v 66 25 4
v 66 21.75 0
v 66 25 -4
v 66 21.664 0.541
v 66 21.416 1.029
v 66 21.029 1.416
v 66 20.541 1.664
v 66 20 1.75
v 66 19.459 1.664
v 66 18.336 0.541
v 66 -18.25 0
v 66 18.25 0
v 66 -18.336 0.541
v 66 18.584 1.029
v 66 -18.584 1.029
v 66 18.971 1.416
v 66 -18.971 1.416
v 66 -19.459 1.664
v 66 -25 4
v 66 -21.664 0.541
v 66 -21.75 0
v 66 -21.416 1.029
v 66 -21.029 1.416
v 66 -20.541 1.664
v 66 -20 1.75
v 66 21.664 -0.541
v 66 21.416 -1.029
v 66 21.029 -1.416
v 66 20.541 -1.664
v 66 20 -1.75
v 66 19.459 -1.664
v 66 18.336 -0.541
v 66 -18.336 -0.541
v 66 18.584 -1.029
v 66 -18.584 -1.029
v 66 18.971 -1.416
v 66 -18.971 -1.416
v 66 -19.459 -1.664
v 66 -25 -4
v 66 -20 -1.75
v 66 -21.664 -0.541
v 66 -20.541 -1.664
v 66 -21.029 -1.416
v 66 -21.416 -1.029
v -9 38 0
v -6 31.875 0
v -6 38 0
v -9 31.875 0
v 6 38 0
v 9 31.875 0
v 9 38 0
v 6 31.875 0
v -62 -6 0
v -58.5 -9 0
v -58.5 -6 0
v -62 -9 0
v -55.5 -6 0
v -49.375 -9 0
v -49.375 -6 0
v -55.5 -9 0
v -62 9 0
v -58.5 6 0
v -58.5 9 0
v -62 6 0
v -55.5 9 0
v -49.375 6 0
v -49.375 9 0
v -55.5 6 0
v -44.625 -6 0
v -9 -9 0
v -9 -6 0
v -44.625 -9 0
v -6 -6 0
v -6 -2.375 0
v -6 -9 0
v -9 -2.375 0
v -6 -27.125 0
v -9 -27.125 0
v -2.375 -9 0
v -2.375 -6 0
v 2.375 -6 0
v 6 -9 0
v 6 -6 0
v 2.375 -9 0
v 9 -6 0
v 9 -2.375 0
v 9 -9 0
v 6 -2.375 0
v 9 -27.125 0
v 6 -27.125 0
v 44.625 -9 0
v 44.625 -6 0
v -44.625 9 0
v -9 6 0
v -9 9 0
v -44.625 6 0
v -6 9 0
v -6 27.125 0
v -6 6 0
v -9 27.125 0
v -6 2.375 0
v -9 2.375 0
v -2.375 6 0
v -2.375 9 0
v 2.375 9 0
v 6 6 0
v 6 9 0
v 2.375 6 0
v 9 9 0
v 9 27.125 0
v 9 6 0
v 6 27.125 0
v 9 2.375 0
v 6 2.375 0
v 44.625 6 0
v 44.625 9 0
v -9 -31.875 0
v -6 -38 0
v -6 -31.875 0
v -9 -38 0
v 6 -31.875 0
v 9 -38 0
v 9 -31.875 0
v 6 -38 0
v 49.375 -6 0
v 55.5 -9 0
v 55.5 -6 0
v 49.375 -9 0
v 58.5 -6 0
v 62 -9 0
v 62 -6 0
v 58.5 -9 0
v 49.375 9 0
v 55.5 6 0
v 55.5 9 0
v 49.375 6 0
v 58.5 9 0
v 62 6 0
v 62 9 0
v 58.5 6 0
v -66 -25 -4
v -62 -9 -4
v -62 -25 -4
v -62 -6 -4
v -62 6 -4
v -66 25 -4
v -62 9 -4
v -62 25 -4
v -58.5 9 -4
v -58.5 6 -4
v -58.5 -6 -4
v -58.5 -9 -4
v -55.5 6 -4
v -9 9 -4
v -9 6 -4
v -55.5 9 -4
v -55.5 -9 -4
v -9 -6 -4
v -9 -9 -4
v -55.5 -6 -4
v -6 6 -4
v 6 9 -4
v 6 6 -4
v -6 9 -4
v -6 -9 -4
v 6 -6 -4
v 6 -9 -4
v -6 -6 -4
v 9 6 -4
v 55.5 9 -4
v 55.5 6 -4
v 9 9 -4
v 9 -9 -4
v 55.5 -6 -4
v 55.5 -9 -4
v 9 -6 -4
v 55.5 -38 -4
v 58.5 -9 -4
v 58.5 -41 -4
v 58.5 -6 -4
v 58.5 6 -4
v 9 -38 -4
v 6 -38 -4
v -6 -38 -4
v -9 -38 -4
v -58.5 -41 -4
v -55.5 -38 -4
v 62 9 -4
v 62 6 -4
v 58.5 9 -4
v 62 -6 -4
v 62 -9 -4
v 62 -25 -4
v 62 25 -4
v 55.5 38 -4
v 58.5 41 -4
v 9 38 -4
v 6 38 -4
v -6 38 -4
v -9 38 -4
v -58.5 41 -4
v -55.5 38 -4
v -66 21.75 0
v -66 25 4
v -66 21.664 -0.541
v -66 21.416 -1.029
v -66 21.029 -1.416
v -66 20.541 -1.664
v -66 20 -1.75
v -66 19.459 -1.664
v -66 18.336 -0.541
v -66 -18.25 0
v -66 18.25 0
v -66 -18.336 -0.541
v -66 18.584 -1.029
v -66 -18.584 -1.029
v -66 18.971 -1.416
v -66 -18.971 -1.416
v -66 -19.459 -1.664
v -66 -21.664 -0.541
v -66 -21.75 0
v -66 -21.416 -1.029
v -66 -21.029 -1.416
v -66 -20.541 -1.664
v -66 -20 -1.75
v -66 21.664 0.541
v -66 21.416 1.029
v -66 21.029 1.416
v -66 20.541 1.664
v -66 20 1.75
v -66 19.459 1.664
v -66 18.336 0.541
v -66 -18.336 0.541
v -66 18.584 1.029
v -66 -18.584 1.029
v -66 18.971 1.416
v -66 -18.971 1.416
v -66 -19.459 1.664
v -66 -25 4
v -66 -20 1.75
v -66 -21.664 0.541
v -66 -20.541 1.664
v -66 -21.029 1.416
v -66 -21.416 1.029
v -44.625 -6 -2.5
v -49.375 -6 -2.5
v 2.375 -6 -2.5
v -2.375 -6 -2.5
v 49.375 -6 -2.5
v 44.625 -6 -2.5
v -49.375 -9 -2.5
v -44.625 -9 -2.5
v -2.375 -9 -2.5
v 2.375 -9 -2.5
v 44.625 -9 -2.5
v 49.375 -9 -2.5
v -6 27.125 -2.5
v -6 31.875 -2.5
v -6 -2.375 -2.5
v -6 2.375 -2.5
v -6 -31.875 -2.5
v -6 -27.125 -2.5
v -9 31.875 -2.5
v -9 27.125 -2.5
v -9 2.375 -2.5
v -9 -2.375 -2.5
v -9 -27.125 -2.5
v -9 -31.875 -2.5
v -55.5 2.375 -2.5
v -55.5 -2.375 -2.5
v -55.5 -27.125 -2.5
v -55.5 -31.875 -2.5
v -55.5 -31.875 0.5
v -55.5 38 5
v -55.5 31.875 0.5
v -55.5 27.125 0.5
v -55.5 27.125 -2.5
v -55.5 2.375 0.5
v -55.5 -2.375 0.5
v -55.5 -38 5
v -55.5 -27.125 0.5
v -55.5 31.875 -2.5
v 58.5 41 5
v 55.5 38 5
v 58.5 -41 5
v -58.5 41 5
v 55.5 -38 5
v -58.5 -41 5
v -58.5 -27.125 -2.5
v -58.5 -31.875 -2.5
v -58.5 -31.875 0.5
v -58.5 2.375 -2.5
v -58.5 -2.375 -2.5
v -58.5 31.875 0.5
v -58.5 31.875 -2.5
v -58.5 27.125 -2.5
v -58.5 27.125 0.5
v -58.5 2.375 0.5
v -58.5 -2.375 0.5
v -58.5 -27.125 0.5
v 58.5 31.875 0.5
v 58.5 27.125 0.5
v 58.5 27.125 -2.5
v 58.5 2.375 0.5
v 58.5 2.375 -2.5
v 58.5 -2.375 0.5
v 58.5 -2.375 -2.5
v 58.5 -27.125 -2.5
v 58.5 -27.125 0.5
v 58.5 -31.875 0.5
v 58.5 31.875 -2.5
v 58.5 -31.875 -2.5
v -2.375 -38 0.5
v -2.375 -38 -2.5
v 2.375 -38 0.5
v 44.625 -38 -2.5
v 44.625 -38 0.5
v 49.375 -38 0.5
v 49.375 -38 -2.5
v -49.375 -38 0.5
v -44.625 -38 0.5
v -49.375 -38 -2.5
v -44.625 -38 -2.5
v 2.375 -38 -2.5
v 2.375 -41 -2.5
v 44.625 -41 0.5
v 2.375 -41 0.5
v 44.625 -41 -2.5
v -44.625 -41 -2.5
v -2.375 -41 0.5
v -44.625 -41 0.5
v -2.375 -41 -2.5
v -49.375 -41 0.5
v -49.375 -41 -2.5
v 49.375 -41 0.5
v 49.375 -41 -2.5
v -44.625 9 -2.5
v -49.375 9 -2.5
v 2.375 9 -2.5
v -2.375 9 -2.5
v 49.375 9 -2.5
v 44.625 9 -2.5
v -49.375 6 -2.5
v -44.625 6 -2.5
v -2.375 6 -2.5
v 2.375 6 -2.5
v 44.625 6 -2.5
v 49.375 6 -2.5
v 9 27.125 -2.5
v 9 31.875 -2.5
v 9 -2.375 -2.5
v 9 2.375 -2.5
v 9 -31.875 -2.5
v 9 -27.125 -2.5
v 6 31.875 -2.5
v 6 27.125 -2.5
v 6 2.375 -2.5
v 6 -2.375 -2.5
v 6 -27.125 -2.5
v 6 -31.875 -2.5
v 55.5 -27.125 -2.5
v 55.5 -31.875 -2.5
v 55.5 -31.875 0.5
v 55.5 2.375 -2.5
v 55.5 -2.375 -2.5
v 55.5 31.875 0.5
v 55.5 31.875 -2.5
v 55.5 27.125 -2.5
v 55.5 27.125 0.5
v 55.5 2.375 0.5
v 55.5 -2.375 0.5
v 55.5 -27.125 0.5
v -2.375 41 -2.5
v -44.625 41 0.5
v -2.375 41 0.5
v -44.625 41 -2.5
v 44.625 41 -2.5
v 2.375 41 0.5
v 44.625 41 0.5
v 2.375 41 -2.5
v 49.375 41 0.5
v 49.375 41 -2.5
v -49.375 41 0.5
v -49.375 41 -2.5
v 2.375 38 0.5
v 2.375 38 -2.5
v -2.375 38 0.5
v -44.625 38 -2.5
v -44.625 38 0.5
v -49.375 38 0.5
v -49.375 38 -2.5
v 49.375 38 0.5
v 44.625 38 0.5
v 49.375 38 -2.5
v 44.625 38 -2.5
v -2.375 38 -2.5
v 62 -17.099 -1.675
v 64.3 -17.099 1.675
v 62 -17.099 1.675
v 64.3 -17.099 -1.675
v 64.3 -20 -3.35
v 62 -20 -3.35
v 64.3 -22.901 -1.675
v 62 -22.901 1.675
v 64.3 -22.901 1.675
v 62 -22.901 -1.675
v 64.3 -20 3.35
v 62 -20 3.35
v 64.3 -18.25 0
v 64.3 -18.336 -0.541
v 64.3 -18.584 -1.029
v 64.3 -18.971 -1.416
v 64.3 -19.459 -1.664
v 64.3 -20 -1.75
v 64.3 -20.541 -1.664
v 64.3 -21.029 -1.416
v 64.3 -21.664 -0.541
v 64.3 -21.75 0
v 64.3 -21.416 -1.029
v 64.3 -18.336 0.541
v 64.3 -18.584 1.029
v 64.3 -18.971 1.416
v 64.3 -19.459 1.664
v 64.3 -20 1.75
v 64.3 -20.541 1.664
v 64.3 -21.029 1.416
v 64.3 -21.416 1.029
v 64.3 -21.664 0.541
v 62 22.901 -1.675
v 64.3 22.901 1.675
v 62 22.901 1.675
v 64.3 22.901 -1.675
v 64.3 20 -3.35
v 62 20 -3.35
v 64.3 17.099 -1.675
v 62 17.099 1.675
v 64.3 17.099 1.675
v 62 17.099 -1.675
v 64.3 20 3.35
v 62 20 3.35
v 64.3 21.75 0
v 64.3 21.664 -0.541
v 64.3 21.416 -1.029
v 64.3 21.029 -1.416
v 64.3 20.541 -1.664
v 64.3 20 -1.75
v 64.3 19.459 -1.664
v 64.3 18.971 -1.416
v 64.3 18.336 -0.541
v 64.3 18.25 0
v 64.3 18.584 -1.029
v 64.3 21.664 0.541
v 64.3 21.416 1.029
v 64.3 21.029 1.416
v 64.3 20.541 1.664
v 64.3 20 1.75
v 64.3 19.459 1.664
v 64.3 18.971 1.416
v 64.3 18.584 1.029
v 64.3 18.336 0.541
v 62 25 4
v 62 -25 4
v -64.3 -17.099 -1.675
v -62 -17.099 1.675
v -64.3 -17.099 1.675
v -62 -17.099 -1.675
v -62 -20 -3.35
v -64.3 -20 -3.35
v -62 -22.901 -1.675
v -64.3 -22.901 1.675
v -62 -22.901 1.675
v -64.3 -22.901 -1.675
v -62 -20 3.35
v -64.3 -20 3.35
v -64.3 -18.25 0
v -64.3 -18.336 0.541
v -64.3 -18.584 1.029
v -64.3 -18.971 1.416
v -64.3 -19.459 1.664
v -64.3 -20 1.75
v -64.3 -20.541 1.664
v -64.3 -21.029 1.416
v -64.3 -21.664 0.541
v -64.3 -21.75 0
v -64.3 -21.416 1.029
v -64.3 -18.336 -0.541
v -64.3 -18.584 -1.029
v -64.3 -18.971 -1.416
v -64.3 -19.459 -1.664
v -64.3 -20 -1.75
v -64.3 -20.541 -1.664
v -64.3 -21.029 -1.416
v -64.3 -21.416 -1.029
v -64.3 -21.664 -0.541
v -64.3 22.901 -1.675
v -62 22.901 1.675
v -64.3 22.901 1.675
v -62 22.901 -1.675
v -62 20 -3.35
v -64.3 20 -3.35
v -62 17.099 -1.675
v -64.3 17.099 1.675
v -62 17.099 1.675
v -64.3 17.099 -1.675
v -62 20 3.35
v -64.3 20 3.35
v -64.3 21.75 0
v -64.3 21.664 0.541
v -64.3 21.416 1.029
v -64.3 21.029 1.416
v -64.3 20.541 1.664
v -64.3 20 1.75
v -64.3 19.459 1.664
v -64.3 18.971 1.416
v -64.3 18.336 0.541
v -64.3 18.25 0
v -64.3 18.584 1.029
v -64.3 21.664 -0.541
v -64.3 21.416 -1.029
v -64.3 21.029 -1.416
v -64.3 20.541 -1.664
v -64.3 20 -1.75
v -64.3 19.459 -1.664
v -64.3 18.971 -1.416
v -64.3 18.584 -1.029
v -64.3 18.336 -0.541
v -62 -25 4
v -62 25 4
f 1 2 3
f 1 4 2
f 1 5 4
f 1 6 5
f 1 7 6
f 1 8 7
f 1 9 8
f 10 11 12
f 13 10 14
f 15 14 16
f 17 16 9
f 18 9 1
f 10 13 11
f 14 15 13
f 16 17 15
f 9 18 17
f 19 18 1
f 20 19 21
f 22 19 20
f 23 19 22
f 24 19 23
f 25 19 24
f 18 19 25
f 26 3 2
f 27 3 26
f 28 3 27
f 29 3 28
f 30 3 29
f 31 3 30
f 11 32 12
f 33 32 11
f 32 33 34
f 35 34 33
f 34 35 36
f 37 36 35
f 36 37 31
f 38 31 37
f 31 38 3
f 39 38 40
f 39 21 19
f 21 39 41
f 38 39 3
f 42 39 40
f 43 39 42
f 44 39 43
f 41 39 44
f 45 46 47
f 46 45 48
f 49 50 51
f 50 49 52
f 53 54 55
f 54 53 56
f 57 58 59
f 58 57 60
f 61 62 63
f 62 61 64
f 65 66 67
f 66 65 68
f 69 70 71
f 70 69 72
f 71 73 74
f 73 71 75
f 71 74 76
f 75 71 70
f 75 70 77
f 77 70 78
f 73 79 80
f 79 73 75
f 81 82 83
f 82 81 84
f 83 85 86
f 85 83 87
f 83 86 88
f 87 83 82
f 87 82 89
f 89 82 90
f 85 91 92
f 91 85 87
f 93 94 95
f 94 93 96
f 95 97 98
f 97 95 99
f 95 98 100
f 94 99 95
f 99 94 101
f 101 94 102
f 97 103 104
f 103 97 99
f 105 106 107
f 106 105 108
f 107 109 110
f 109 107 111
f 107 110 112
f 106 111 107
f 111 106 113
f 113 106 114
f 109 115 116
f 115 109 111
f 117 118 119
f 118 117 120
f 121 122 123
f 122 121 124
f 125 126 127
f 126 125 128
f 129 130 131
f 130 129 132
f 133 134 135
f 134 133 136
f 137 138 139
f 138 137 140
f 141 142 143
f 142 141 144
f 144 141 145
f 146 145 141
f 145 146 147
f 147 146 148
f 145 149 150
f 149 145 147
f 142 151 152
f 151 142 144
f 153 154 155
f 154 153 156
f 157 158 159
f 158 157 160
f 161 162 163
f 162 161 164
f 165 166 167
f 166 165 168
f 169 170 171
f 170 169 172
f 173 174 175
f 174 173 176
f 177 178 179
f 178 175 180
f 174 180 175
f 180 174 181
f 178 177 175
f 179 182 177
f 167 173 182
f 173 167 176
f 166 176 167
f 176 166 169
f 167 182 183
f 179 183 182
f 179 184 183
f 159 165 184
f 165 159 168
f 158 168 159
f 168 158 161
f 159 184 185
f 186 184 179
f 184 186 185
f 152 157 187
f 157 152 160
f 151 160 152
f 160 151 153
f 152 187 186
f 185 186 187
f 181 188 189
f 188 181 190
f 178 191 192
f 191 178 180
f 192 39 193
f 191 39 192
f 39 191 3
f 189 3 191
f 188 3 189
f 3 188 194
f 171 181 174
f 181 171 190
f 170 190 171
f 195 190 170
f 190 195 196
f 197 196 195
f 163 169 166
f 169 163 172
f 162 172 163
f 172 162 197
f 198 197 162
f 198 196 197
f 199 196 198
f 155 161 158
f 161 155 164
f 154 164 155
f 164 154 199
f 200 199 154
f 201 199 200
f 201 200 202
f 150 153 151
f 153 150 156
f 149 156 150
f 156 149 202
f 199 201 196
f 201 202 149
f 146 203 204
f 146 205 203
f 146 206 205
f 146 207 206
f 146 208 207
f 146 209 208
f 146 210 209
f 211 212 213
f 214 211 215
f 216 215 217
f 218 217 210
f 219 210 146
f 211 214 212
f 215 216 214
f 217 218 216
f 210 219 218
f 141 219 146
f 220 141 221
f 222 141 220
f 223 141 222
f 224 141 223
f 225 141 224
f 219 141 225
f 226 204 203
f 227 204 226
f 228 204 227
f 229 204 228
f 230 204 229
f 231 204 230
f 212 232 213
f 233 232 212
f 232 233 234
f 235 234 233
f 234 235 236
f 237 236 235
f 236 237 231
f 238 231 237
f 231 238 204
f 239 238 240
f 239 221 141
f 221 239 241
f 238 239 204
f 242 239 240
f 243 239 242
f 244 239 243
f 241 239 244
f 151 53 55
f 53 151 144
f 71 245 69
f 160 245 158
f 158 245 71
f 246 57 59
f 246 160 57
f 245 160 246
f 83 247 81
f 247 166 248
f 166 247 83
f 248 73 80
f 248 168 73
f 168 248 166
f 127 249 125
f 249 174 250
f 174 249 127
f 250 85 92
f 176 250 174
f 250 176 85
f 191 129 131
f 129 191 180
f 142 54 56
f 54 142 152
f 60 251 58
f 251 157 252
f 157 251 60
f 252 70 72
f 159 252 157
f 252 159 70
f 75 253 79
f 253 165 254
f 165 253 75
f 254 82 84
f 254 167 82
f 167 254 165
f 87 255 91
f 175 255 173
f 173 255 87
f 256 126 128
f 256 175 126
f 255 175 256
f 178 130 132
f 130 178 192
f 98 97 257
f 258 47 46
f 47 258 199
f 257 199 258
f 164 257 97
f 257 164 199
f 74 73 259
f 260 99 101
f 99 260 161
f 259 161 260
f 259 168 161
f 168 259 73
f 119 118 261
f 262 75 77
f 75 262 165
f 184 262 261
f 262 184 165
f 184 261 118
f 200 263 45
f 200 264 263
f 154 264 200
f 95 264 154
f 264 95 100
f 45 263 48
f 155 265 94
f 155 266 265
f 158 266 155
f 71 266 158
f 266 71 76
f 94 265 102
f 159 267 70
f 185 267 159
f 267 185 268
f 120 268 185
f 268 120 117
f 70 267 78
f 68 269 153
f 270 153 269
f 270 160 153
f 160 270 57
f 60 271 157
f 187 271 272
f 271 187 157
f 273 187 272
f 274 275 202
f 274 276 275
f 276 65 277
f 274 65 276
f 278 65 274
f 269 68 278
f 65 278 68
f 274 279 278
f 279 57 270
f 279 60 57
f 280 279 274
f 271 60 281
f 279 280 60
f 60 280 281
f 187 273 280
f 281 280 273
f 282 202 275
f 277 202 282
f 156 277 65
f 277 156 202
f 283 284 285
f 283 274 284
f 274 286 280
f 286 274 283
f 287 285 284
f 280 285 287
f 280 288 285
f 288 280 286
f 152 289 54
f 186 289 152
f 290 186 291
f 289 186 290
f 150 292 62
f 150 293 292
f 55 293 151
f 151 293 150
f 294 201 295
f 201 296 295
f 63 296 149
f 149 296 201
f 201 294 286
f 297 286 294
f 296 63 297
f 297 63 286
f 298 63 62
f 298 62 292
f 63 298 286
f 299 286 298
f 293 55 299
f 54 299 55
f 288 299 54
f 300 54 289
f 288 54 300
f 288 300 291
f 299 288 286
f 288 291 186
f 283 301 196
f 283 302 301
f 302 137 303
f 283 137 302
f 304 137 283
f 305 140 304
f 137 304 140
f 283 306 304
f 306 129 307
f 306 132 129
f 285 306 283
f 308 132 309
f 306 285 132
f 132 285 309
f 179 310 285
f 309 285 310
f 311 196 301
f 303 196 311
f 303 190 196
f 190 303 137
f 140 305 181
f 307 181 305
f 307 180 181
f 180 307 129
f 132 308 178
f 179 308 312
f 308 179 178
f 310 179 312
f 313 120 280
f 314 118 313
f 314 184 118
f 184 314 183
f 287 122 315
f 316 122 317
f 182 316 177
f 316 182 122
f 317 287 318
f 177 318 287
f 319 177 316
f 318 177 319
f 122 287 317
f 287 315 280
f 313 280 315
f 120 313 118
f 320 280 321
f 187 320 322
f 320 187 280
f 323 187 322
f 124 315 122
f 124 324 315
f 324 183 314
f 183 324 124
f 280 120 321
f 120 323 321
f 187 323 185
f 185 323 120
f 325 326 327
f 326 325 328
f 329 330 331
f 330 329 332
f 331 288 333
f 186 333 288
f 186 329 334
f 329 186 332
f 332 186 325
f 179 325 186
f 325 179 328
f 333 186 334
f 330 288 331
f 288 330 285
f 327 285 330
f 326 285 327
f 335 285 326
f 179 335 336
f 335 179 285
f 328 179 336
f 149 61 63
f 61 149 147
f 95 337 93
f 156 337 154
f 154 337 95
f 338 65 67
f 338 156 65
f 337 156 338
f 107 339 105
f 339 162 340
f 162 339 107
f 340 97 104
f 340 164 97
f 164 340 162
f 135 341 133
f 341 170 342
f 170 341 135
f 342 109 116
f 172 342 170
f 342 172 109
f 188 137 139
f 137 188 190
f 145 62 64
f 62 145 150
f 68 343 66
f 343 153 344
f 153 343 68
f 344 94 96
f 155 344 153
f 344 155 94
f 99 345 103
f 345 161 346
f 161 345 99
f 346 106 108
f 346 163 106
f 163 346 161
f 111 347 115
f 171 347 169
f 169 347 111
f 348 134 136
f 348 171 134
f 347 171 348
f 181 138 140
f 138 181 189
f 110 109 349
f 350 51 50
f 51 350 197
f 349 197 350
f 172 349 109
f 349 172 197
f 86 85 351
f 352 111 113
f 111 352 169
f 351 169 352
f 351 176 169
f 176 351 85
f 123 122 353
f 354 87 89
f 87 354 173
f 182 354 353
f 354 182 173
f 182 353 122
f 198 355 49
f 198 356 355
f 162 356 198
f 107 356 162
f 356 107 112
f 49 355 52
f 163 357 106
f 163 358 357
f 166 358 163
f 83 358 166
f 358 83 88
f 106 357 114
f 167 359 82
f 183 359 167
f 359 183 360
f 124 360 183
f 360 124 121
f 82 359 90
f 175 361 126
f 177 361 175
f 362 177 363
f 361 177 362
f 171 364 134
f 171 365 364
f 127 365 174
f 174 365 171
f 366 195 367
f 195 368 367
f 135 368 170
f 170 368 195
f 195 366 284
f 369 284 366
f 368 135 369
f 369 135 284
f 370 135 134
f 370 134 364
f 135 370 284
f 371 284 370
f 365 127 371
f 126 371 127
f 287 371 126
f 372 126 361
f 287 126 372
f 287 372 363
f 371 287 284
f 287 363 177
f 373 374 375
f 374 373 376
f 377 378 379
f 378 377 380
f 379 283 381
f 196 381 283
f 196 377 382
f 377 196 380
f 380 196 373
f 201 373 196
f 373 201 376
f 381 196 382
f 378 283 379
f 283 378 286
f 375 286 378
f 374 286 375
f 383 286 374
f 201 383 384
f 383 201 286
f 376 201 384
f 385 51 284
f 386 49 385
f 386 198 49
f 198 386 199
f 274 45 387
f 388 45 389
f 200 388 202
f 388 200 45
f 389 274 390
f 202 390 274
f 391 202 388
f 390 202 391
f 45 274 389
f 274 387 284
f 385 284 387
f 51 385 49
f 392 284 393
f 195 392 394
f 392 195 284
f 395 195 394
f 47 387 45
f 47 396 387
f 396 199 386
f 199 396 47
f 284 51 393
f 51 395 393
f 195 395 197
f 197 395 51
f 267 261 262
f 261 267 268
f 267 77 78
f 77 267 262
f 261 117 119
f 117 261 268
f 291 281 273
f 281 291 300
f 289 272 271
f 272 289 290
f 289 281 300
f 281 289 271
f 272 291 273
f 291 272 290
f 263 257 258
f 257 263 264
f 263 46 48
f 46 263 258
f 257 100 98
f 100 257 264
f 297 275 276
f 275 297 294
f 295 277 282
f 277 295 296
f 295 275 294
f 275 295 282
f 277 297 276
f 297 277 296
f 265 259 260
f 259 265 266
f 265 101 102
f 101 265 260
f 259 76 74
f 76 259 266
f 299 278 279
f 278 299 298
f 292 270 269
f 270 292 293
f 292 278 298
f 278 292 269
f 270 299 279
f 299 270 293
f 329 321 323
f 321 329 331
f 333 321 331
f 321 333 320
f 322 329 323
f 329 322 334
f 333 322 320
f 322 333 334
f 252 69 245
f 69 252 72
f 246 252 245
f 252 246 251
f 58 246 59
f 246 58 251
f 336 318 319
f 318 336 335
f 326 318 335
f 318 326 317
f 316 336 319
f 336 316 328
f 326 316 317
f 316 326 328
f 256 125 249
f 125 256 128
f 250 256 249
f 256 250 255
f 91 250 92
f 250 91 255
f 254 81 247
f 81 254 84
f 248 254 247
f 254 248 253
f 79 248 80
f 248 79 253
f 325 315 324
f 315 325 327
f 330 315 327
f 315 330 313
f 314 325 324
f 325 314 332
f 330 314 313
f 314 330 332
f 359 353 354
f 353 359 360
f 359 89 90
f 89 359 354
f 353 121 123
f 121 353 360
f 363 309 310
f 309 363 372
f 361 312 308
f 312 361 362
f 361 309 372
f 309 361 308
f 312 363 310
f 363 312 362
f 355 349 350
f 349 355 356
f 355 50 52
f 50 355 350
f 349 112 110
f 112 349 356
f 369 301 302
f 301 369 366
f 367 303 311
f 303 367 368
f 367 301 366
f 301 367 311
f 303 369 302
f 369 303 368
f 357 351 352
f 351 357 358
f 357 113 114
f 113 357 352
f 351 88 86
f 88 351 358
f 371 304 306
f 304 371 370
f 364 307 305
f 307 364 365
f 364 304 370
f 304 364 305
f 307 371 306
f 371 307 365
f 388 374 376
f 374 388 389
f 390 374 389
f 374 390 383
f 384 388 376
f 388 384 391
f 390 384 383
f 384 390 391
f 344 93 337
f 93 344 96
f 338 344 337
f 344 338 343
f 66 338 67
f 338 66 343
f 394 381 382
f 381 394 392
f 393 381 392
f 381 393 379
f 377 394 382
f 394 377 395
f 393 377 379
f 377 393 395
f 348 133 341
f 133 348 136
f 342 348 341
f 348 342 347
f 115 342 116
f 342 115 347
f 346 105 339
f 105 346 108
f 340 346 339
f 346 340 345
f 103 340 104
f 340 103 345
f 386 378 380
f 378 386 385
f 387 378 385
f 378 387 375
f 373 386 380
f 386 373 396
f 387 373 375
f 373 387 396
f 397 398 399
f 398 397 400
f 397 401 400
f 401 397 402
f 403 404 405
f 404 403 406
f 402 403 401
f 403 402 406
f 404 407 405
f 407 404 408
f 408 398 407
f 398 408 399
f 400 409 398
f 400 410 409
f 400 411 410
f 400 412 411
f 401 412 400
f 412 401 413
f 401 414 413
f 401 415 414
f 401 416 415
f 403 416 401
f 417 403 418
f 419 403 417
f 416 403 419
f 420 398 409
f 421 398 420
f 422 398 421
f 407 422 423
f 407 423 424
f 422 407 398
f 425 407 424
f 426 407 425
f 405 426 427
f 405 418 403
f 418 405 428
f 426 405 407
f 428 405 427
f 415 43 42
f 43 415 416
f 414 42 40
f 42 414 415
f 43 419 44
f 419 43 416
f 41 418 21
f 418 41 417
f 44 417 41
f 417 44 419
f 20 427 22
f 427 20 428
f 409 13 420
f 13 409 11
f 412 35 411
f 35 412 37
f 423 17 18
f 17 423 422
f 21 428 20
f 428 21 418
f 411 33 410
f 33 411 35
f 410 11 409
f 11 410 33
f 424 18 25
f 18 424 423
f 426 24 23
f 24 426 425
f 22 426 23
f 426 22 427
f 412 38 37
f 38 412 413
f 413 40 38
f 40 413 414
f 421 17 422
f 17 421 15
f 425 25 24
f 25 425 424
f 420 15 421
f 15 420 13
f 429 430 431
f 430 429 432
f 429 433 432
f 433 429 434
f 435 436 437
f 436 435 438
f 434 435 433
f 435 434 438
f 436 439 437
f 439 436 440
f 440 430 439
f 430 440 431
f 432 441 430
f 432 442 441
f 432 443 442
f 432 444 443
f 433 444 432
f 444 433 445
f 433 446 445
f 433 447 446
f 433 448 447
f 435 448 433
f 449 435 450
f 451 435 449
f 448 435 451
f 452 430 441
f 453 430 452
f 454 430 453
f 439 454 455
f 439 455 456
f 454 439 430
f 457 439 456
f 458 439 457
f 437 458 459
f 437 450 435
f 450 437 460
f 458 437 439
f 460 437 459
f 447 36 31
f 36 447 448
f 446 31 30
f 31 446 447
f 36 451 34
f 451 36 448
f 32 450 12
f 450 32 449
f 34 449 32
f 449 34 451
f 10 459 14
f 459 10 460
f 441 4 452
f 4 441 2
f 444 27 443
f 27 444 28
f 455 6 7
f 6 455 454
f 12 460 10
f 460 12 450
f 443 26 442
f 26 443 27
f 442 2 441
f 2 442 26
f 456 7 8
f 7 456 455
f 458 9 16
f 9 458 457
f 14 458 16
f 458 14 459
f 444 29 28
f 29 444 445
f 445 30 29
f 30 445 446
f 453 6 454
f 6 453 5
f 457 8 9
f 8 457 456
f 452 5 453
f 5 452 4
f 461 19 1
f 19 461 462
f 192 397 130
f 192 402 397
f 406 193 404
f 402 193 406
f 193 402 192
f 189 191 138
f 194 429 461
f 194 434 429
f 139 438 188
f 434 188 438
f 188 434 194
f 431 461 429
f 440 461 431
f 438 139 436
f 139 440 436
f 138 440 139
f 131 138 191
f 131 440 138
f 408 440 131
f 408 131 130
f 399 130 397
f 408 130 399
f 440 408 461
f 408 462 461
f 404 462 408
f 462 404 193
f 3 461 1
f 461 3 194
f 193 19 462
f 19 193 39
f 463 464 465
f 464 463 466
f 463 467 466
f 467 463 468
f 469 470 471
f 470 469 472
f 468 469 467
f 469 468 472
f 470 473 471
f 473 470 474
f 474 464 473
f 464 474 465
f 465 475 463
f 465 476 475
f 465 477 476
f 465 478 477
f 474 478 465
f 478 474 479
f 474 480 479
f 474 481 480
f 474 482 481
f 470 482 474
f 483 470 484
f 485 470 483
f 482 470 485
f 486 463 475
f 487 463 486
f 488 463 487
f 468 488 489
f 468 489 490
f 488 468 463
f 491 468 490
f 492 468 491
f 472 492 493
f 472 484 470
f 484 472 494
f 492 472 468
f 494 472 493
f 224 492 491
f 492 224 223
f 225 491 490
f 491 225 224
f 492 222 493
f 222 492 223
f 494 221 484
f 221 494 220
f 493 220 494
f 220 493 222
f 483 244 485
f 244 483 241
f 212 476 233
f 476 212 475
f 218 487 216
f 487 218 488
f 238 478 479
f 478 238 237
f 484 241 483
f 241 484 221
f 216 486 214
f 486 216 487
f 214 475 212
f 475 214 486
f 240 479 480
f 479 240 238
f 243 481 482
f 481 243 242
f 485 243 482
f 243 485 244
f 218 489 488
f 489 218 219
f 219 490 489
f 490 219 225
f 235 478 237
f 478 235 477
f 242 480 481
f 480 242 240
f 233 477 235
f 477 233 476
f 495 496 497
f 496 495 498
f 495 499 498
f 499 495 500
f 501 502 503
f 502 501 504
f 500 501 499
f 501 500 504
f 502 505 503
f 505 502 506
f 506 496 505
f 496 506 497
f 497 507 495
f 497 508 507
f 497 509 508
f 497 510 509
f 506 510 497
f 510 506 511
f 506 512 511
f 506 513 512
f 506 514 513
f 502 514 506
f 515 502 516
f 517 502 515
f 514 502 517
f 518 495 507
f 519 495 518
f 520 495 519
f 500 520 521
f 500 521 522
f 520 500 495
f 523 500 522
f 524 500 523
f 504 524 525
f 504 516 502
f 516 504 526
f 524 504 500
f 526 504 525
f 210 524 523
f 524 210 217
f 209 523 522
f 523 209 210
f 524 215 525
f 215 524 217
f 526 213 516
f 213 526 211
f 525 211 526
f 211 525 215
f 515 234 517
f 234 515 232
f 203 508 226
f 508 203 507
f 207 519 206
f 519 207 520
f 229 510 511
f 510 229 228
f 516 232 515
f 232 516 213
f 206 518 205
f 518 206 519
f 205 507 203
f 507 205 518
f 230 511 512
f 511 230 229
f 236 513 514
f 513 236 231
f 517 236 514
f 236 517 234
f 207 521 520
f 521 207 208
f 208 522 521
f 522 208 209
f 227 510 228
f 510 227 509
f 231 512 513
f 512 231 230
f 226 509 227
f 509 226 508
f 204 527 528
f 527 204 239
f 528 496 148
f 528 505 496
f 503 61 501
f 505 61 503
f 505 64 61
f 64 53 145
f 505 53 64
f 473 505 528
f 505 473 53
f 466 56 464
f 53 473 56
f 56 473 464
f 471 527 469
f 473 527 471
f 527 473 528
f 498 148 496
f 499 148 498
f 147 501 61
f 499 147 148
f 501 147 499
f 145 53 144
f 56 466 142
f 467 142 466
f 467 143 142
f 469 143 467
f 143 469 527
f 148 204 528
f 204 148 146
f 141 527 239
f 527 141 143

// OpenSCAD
// file: joiner.scad
OUTER_SHAPE_WIDTH=8;
OUTER_SHAPE_HEIGHT=8;
INNER_CUBE_THICKNESS=3.5;
INNER_CUBE_LENGTH=7;

HULL_CONNECTOR_LENGTH=2;

ENTRY_ANGLE=45;
MAX_PIECE_SIZE=200;

FIT_WIDTH=0.05;
FIT_ON_MALE=0;

module male_connector()
{
    translate([INNER_CUBE_LENGTH/2,0,0]) cube([INNER_CUBE_LENGTH,INNER_CUBE_THICKNESS-FIT_ON_MALE*FIT_WIDTH,INNER_CUBE_THICKNESS-FIT_ON_MALE*FIT_WIDTH],center=true);
    translate([-MAX_PIECE_SIZE/2,0,0]) cube([MAX_PIECE_SIZE,OUTER_SHAPE_WIDTH,OUTER_SHAPE_HEIGHT],center=true);
    hull(){
    translate([INNER_CUBE_LENGTH-HULL_CONNECTOR_LENGTH/2,0,0]) color([1,0,0]) cube([HULL_CONNECTOR_LENGTH,INNER_CUBE_THICKNESS-FIT_ON_MALE*FIT_WIDTH,INNER_CUBE_THICKNESS-FIT_ON_MALE*FIT_WIDTH],center=true);
    translate([HULL_CONNECTOR_LENGTH/2,0,OUTER_SHAPE_HEIGHT/4-OUTER_SHAPE_HEIGHT/2]) color([0,1,0]) cube([HULL_CONNECTOR_LENGTH,INNER_CUBE_THICKNESS-FIT_ON_MALE*FIT_WIDTH,OUTER_SHAPE_HEIGHT/2],center=true);
    }
}

module female_connector()
{
    difference()
    {
    translate([MAX_PIECE_SIZE/2,0,0]) color([1,0,0]) cube([MAX_PIECE_SIZE,OUTER_SHAPE_WIDTH,OUTER_SHAPE_HEIGHT],center=true);
    male_connector();
    }
}
//translate([0,10,0]) male_connector();
female_connector();
// file: hex_trap.scad
function make_r_for_screw_standard(r_trap) =
((r_trap==2) ? 2.2 : (r_trap==2.5) ? 2.5 : (r_trap==3) ? 3.35 : (r_trap==4) ? 4.2 : (r_trap==6) ? 4.8 : r_trap);

function make_r_hole_for_screw_standard(r_trap) =
((r_trap==2) ? 1.1 : (r_trap==2.5) ? 1.5 : (r_trap==3) ? 1.75 : (r_trap==4) ? 2.5 : (r_trap==6) ? 3.4 : r_trap);

module low_level_hex_hole(h_trap,h_hole,local_r_trap,local_r_hole,rot)
{
    rotate([rot,0,0]) {
        translate([0,0,h_hole])
            {
                cylinder(h = h_trap, r = local_r_trap, $fn = 6);
            }
        cylinder(h = h_hole, r = local_r_hole, $fn = 20);
    }
}
module hex_hole(h_trap,h_hole,r_trap,rot)
{
    low_level_hex_hole(h_trap=h_trap,h_hole=h_hole,local_r_trap=make_r_for_screw_standard(r_trap),local_r_hole=make_r_hole_for_screw_standard(r_trap),rot=rot);
}
module hex_hole_exit(h_trap,h_hole,r_trap,rot,l_exit,rot_exit)
{
    low_level_hex_hole(h_trap=h_trap,h_hole=h_hole,local_r_trap=make_r_for_screw_standard(r_trap),local_r_hole=make_r_hole_for_screw_standard(r_trap),rot=rot);
    rotate([rot,0,0]) translate([0,make_r_for_screw_standard(r_trap),h_hole]) rotate([0,0,rot_exit]) cube([l_exit,make_r_for_screw_standard(r_trap)*2,h_trap]);
    
}
module hex_hole_exit_tunnel(h_trap,h_hole,r_trap,rot,l_exit,rot_exit,l_tunnel)
{
    rotate([rot,0,0]) {
        translate([0,0,h_trap+h_hole-1])
        {
            cylinder(h = l_tunnel, r = make_r_hole_for_screw_standard(r_trap), $fn = 20);
        }
    }
    low_level_hex_hole(h_trap=h_trap,h_hole=h_hole,local_r_trap=make_r_for_screw_standard(r_trap),local_r_hole=make_r_hole_for_screw_standard(r_trap),rot=rot);
    rotate([rot,0,0]) translate([0,(r_trap),h_hole]) rotate([0,0,rot_exit]) cube([l_exit,(r_trap)*2,h_trap]);
    
}
module hex_hole_fill_bottom(h_trap,h_hole,r_trap,r_hole,rot)
{
    
    
    local_r_trap=make_r_for_screw_standard(r_trap);
    
    
    
    rotate([rot,0,0]) {
translate([0,0,h_hole-0.3])
{
	cylinder(h = 0.3, r = local_r_trap, $fn = 6);
}

	

}
}
module hex_hole_fill_top(h_trap,h_hole,r_trap,r_hole,rot)
{
    
    
    local_r_trap=make_r_for_screw_standard(r_trap);
    rotate([rot,0,0]) {


	cylinder(h = 0.3, r = r_hole, $fn = 20);

}
}
// main file
use <main.scad>
BUILD_VOLUME=190;
//translate([0,0,-8/2]) #cube([BUILD_VOLUME+20,BUILD_VOLUME,1],center=true);
/*
translate([0,-BUILD_VOLUME/2+4,0]) generate_vertical_beams();
translate([0,-BUILD_VOLUME/2+4+18.5,0]) generate_vertical_beams();
translate([0,-BUILD_VOLUME/2+41,0])generate_horizontal_short_beams();
translate([0,-BUILD_VOLUME/2+50,0])generate_horizontal_short_beams();
translate([0,-BUILD_VOLUME/2+59,0])generate_horizontal_long_beams();
translate([0,-BUILD_VOLUME/2+68,0])generate_horizontal_long_beams();
translate([0,-BUILD_VOLUME/2+77,0])mirror([0,1,0]) generate_horizontal_long_beams();
translate([0,-BUILD_VOLUME/2+86,0]) mirror([0,1,0])generate_horizontal_long_beams();
*/
/*
translate([0,9,0]) generate_side_beams();
translate([0,-20+127,0]) rotate([0,0,90])
intersection(){
translate([-100,0,0])#cube([200,200,200],center=true);
pine64_beams_assembly();}
translate([20,8+127,0]) rotate([0,0,90])
intersection(){
translate([-100,0,0])#cube([200,200,200],center=true);
pine64_beams_assembly();}
*/
/*
POWER_HOLES_LENGTH=58;
POWER_HOLES_WIDTH=34.75;
singlebeamsupport(x1=-POWER_HOLES_LENGTH/2,y1=POWER_HOLES_WIDTH/2,x2=-POWER_HOLES_LENGTH/2,y2=-POWER_HOLES_WIDTH/2,x3=POWER_HOLES_LENGTH/2,y3=POWER_HOLES_WIDTH/2,x4=POWER_HOLES_LENGTH/2,y4=-POWER_HOLES_WIDTH/2);
*/
//tower_panel_fan();
/*Male side beams
LENGTH=300;
WIDTH=30;
HEIGHT=10;
intersection(){
translate([-LENGTH/2+20,0,0])#cube([LENGTH,WIDTH,HEIGHT],center=true);
generate_side_beams();
}
*/
/*
//Female side beams
rotate([180,0,0]){
LENGTH=250;
WIDTH=30;
HEIGHT=10;
intersection(){
translate([+LENGTH/2-20,0,0])#cube([LENGTH,WIDTH,HEIGHT],center=true);
generate_side_beams();
}
}
*/
/*
HDD_WIDTH=84;
HDD_LENGTH=112;
doublebeamsupportrectangle(length=HDD_WIDTH,width=HDD_LENGTH);
*/
/*
PI BEAM
SHIFT_X=20;
PI_HOLES_LENGTH=58;
PI_HOLES_WIDTH=49;
singlebeamsupport(x1=-PI_HOLES_LENGTH/2-SHIFT_X,y1=PI_HOLES_WIDTH/2,x2=-PI_HOLES_LENGTH/2-SHIFT_X,y2=-PI_HOLES_WIDTH/2,x3=PI_HOLES_LENGTH/2-SHIFT_X,y3=PI_HOLES_WIDTH/2,x4=PI_HOLES_LENGTH/2-SHIFT_X,y4=-PI_HOLES_WIDTH/2,standard=2);
*/
///*
SWITCH_WIDTH=79;
SWITCH_LENGTH=114;
doublebeamsupportrectangle(length=SWITCH_WIDTH,width=SWITCH_LENGTH);
//*/
